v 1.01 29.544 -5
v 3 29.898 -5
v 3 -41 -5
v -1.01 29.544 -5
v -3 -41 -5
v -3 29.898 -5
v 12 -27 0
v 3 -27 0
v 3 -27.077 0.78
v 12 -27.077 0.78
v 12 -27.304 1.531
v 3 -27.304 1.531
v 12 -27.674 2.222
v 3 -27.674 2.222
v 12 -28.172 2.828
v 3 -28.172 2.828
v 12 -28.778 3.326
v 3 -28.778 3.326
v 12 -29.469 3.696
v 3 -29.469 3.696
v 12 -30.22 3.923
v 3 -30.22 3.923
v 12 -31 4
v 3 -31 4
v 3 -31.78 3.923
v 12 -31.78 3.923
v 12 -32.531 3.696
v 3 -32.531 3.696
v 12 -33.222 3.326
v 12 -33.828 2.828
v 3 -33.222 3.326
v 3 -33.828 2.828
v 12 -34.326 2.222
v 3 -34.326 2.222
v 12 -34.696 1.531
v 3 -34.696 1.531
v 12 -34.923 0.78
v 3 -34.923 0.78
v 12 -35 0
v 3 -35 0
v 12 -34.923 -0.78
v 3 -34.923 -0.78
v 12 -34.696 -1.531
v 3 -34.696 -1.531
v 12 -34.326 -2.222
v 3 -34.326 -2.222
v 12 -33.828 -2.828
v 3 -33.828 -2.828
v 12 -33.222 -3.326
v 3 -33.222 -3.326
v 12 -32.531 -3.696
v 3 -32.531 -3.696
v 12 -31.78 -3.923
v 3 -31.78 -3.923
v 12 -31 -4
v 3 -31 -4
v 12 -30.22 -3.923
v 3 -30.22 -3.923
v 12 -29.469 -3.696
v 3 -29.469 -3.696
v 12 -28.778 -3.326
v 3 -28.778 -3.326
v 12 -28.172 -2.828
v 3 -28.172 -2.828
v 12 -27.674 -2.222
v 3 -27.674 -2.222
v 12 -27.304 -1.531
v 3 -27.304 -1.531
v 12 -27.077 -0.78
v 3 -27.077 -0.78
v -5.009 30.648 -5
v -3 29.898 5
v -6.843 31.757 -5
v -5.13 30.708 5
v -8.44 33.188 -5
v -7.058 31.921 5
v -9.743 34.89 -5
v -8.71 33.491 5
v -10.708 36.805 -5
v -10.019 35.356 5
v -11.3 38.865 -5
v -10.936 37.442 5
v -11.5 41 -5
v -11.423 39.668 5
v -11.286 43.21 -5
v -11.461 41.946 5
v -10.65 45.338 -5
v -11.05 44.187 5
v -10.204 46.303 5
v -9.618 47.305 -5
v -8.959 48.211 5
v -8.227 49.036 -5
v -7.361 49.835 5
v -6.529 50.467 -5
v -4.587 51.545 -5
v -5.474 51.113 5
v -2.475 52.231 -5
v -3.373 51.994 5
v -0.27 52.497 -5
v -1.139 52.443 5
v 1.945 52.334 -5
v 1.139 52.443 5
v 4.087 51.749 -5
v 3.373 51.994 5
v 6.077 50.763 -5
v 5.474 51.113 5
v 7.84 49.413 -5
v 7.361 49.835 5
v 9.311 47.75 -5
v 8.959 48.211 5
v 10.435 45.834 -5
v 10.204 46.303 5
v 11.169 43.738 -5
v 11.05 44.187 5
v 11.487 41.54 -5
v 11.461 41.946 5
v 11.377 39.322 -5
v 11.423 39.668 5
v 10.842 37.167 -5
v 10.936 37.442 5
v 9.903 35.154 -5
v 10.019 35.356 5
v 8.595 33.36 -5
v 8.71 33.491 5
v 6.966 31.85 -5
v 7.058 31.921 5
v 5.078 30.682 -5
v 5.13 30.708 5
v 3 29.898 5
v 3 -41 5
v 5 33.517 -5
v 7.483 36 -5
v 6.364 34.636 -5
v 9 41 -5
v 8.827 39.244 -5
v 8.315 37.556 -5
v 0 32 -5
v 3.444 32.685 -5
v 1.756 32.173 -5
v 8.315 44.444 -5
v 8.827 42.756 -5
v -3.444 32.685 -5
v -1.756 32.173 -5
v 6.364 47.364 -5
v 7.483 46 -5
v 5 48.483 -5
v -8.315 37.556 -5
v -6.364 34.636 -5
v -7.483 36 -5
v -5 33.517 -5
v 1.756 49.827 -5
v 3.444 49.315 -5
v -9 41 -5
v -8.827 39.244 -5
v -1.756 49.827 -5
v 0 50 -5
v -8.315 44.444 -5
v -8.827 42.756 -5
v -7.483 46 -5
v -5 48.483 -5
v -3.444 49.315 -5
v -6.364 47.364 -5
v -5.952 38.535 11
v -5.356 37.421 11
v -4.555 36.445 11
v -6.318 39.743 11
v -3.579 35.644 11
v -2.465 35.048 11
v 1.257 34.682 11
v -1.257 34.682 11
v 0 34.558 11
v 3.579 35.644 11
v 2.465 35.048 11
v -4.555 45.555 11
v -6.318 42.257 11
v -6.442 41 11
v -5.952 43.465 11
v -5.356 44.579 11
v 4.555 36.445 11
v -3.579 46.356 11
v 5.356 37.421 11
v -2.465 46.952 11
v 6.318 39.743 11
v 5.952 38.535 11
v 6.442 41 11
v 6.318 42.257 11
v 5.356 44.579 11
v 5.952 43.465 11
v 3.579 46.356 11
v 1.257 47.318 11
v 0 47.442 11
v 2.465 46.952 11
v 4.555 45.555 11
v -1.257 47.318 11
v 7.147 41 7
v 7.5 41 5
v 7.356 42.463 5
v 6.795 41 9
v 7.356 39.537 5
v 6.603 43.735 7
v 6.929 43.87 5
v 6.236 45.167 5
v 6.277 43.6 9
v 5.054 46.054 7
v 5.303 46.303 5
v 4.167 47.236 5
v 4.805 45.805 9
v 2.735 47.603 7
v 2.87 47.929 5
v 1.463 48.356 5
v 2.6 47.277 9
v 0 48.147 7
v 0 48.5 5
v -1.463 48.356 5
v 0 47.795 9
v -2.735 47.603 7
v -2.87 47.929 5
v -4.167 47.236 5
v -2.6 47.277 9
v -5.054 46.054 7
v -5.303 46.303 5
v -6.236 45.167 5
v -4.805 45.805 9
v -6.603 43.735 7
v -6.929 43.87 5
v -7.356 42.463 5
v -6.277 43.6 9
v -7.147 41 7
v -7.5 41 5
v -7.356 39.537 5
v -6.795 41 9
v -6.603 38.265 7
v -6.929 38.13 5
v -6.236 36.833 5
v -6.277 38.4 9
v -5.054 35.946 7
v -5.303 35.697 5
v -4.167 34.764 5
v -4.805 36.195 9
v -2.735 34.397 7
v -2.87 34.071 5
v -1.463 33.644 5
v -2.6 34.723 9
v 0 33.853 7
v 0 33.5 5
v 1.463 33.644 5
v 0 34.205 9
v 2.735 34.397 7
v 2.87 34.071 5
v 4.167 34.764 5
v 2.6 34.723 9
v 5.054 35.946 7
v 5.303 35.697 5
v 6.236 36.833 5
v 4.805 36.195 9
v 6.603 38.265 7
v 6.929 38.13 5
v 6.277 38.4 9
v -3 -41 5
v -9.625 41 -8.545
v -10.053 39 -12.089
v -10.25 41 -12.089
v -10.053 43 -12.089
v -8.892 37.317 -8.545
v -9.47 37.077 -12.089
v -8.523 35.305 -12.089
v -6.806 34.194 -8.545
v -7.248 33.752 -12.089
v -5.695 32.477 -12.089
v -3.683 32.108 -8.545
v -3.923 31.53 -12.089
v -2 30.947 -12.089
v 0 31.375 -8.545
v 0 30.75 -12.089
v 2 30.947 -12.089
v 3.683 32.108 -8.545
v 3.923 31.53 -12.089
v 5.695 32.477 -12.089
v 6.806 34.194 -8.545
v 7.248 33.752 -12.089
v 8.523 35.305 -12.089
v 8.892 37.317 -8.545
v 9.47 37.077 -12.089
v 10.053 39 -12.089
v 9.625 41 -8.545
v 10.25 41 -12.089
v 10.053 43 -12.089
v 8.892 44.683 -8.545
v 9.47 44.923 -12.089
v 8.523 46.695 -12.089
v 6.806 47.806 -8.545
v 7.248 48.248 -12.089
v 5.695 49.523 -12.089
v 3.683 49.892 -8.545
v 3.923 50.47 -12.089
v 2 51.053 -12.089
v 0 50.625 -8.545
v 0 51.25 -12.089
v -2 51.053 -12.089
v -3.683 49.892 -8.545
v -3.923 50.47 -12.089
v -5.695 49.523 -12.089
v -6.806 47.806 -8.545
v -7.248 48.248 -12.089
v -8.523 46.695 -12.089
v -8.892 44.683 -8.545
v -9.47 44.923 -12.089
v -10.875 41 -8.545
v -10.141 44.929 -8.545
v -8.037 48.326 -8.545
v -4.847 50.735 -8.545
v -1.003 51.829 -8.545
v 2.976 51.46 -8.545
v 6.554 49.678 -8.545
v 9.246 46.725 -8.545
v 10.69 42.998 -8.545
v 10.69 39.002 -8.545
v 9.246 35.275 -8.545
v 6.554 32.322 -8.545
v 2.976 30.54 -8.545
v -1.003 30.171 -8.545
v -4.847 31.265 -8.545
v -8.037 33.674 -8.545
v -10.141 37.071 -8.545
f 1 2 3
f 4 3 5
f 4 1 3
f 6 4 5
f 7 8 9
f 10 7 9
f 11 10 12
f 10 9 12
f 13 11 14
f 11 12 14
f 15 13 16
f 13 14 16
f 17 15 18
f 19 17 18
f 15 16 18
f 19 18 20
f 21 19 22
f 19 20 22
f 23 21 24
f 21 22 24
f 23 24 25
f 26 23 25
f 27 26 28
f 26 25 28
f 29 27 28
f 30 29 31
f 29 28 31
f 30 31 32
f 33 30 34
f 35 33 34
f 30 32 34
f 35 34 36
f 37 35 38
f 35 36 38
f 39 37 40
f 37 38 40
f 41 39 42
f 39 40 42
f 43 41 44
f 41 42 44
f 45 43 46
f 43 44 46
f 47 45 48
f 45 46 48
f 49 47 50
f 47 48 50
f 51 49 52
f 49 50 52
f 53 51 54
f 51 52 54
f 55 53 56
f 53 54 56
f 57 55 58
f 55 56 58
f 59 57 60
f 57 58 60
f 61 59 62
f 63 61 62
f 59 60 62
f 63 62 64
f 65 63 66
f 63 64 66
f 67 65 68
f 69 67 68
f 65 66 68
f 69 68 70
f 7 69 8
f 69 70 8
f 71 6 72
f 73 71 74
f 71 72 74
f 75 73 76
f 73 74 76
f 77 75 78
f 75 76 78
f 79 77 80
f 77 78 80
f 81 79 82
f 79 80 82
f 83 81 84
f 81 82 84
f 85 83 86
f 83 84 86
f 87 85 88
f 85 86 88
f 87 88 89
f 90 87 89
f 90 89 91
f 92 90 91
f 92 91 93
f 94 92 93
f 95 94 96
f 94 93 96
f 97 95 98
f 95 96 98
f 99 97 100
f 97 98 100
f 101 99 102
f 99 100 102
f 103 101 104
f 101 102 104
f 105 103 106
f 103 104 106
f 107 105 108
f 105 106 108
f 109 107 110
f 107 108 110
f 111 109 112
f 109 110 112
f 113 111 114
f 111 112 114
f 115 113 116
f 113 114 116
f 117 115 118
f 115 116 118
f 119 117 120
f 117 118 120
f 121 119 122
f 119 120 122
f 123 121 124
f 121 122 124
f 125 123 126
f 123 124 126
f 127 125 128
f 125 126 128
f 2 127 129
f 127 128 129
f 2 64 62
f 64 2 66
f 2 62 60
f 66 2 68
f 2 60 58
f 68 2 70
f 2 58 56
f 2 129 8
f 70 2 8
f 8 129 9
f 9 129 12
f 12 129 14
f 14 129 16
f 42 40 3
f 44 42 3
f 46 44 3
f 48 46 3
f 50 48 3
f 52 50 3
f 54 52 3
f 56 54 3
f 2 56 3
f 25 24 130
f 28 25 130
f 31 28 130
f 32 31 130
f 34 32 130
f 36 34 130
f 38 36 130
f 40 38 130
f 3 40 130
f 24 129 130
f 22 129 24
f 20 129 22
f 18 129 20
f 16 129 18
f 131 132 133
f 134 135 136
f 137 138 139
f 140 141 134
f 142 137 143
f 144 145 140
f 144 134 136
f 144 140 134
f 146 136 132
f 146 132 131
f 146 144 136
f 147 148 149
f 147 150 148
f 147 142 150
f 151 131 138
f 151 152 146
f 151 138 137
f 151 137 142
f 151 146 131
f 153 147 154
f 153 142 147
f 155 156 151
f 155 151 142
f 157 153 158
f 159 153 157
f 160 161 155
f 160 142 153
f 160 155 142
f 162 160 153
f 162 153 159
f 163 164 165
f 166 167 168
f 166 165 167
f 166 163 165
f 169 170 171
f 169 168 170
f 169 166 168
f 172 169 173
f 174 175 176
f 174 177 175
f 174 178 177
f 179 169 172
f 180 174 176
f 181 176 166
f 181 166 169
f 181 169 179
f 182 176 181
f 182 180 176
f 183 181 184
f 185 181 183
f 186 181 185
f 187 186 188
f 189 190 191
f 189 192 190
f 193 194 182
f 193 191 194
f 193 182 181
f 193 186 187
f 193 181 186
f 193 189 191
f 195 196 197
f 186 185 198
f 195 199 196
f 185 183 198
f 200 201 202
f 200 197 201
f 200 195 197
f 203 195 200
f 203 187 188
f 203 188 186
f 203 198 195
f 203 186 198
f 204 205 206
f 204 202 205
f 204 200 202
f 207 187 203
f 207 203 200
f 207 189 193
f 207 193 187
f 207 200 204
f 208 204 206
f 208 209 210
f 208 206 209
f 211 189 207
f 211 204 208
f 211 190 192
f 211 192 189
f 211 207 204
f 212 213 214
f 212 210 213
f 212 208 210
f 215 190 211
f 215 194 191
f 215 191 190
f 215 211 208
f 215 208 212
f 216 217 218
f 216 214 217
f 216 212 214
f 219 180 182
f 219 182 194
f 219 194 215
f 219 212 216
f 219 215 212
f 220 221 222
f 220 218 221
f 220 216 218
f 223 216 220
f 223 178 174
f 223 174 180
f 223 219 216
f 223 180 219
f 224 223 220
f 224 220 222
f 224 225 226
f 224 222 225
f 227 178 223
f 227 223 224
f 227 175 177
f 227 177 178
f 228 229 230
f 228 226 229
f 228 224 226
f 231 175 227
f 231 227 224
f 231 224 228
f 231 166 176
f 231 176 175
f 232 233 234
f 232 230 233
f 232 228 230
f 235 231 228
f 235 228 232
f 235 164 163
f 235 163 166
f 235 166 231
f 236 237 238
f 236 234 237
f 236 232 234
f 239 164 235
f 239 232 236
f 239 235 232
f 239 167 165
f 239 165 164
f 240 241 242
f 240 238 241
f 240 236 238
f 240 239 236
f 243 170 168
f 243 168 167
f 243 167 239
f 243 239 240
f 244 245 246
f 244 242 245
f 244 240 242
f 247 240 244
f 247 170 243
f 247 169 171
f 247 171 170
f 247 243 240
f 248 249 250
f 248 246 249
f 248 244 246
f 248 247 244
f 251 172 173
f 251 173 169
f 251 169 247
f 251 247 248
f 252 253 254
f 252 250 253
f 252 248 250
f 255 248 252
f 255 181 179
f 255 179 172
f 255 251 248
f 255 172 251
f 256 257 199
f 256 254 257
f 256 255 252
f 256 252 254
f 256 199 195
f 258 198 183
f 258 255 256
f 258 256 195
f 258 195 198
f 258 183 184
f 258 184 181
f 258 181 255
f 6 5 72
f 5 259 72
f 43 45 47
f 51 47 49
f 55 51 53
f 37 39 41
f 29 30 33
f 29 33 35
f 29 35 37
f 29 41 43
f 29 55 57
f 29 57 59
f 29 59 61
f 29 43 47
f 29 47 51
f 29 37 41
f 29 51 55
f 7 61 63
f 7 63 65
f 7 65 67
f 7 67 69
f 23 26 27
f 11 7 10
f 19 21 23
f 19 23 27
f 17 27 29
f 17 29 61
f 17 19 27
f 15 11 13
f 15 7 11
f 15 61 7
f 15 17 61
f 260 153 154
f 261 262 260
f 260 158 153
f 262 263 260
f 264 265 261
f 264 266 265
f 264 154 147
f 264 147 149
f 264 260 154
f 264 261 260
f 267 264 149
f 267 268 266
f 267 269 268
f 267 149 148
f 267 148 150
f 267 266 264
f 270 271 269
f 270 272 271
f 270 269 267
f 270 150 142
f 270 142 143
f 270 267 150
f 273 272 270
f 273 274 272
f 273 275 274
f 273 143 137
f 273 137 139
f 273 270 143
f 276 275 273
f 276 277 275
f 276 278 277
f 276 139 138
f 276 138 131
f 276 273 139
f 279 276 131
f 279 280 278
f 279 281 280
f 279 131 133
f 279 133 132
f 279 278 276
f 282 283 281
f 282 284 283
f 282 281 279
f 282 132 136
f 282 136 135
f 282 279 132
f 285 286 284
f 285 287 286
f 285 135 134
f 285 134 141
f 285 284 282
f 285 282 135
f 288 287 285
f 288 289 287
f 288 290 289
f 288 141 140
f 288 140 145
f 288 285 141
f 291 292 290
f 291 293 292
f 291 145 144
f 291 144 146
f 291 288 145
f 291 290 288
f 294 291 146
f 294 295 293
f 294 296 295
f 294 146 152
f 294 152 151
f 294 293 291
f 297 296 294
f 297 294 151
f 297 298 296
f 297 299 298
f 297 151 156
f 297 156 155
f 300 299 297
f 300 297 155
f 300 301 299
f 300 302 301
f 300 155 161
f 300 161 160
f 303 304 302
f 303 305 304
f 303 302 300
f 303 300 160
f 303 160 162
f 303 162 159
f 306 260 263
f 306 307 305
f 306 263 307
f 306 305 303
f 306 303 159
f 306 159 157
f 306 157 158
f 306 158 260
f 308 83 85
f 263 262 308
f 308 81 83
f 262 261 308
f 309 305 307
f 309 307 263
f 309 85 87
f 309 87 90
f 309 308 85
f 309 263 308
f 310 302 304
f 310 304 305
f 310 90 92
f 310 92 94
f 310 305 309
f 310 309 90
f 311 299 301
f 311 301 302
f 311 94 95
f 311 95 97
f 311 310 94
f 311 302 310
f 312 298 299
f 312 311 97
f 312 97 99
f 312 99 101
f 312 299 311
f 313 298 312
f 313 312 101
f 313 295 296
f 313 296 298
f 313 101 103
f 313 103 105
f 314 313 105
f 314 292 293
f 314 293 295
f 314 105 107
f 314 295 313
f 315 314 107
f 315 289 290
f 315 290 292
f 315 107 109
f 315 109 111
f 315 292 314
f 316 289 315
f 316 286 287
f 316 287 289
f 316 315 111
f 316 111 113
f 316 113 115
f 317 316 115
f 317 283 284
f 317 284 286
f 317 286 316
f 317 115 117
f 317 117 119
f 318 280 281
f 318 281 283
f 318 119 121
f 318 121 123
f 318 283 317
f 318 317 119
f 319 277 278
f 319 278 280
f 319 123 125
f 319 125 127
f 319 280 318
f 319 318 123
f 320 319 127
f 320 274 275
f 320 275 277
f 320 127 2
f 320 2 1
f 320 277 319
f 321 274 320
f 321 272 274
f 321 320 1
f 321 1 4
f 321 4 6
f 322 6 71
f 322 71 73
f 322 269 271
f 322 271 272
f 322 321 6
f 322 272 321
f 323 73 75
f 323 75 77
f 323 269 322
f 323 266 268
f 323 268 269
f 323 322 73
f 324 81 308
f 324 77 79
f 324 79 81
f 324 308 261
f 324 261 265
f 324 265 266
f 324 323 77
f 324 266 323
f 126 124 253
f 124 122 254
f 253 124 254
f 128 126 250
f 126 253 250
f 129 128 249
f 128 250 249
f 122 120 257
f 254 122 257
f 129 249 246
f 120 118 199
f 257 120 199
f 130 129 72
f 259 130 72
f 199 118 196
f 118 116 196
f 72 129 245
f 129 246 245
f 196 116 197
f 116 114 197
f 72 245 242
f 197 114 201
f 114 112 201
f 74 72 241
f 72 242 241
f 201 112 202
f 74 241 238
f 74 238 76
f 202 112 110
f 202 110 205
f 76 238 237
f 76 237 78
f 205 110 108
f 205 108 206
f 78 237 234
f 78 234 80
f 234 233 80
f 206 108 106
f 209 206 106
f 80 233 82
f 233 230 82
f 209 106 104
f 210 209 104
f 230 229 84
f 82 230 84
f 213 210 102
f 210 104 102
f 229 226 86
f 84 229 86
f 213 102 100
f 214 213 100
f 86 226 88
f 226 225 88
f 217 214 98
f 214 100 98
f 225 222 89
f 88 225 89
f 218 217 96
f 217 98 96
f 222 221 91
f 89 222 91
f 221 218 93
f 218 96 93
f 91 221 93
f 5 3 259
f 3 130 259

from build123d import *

# Parameters (mm, degrees)
BOSS_EXTRUDE1_DEPTH = 5
SKETCH2_R           = 7.5
BOSS_EXTRUDE2_DEPTH = 6
BOSS_EXTRUDE2_TAPER = 10
SKETCH3_R           = 4
BOSS_EXTRUDE3_DEPTH = 9
SKETCH4_R           = 11.5
SKETCH4_R_2         = 9
BOSS_EXTRUDE4_DEPTH = 9
BOSS_EXTRUDE4_TAPER = 10


with BuildPart() as part:
    # Sketch1 → Boss-Extrude1 (new, symmetric)
    with BuildSketch(Plane.XY):
        with BuildLine():
            Line((3, 29.898198344), (3, -41))
            Line((3, -41), (-3, -41))
            Line((-3, -41), (-3, 29.898198344))
            ThreePointArc((-3, 29.898198344), (0, 52.5), (3, 29.898198344))
        make_face()
    extrude(amount=BOSS_EXTRUDE1_DEPTH, both=True)

    # Sketch2 → Boss-Extrude2 (add)
    with BuildSketch(Plane.XY.offset(5)):
        with Locations((0, 41)):
            Circle(SKETCH2_R)
    extrude(amount=BOSS_EXTRUDE2_DEPTH, taper=BOSS_EXTRUDE2_TAPER)

    # Sketch3 → Boss-Extrude3 (add)
    with BuildSketch(Plane(origin=(3, 0, 0), x_dir=(0, 0, -1), z_dir=(1, 0, 0))):
        with Locations(Location((0, -31, 0), (0, 0, 90))):
            Circle(SKETCH3_R)
    extrude(amount=BOSS_EXTRUDE3_DEPTH)

    # Sketch4 → Boss-Extrude4 (add)
    with BuildSketch(Plane(origin=(0, 0, -5), x_dir=(-1, 0, 0), z_dir=(0, 0, -1))):
        with Locations((0, 41)):
            Circle(SKETCH4_R)
        with Locations((0, 41)):
            Circle(SKETCH4_R_2, mode=Mode.SUBTRACT)
    extrude(amount=BOSS_EXTRUDE4_DEPTH, taper=BOSS_EXTRUDE4_TAPER)


solid = part.part
